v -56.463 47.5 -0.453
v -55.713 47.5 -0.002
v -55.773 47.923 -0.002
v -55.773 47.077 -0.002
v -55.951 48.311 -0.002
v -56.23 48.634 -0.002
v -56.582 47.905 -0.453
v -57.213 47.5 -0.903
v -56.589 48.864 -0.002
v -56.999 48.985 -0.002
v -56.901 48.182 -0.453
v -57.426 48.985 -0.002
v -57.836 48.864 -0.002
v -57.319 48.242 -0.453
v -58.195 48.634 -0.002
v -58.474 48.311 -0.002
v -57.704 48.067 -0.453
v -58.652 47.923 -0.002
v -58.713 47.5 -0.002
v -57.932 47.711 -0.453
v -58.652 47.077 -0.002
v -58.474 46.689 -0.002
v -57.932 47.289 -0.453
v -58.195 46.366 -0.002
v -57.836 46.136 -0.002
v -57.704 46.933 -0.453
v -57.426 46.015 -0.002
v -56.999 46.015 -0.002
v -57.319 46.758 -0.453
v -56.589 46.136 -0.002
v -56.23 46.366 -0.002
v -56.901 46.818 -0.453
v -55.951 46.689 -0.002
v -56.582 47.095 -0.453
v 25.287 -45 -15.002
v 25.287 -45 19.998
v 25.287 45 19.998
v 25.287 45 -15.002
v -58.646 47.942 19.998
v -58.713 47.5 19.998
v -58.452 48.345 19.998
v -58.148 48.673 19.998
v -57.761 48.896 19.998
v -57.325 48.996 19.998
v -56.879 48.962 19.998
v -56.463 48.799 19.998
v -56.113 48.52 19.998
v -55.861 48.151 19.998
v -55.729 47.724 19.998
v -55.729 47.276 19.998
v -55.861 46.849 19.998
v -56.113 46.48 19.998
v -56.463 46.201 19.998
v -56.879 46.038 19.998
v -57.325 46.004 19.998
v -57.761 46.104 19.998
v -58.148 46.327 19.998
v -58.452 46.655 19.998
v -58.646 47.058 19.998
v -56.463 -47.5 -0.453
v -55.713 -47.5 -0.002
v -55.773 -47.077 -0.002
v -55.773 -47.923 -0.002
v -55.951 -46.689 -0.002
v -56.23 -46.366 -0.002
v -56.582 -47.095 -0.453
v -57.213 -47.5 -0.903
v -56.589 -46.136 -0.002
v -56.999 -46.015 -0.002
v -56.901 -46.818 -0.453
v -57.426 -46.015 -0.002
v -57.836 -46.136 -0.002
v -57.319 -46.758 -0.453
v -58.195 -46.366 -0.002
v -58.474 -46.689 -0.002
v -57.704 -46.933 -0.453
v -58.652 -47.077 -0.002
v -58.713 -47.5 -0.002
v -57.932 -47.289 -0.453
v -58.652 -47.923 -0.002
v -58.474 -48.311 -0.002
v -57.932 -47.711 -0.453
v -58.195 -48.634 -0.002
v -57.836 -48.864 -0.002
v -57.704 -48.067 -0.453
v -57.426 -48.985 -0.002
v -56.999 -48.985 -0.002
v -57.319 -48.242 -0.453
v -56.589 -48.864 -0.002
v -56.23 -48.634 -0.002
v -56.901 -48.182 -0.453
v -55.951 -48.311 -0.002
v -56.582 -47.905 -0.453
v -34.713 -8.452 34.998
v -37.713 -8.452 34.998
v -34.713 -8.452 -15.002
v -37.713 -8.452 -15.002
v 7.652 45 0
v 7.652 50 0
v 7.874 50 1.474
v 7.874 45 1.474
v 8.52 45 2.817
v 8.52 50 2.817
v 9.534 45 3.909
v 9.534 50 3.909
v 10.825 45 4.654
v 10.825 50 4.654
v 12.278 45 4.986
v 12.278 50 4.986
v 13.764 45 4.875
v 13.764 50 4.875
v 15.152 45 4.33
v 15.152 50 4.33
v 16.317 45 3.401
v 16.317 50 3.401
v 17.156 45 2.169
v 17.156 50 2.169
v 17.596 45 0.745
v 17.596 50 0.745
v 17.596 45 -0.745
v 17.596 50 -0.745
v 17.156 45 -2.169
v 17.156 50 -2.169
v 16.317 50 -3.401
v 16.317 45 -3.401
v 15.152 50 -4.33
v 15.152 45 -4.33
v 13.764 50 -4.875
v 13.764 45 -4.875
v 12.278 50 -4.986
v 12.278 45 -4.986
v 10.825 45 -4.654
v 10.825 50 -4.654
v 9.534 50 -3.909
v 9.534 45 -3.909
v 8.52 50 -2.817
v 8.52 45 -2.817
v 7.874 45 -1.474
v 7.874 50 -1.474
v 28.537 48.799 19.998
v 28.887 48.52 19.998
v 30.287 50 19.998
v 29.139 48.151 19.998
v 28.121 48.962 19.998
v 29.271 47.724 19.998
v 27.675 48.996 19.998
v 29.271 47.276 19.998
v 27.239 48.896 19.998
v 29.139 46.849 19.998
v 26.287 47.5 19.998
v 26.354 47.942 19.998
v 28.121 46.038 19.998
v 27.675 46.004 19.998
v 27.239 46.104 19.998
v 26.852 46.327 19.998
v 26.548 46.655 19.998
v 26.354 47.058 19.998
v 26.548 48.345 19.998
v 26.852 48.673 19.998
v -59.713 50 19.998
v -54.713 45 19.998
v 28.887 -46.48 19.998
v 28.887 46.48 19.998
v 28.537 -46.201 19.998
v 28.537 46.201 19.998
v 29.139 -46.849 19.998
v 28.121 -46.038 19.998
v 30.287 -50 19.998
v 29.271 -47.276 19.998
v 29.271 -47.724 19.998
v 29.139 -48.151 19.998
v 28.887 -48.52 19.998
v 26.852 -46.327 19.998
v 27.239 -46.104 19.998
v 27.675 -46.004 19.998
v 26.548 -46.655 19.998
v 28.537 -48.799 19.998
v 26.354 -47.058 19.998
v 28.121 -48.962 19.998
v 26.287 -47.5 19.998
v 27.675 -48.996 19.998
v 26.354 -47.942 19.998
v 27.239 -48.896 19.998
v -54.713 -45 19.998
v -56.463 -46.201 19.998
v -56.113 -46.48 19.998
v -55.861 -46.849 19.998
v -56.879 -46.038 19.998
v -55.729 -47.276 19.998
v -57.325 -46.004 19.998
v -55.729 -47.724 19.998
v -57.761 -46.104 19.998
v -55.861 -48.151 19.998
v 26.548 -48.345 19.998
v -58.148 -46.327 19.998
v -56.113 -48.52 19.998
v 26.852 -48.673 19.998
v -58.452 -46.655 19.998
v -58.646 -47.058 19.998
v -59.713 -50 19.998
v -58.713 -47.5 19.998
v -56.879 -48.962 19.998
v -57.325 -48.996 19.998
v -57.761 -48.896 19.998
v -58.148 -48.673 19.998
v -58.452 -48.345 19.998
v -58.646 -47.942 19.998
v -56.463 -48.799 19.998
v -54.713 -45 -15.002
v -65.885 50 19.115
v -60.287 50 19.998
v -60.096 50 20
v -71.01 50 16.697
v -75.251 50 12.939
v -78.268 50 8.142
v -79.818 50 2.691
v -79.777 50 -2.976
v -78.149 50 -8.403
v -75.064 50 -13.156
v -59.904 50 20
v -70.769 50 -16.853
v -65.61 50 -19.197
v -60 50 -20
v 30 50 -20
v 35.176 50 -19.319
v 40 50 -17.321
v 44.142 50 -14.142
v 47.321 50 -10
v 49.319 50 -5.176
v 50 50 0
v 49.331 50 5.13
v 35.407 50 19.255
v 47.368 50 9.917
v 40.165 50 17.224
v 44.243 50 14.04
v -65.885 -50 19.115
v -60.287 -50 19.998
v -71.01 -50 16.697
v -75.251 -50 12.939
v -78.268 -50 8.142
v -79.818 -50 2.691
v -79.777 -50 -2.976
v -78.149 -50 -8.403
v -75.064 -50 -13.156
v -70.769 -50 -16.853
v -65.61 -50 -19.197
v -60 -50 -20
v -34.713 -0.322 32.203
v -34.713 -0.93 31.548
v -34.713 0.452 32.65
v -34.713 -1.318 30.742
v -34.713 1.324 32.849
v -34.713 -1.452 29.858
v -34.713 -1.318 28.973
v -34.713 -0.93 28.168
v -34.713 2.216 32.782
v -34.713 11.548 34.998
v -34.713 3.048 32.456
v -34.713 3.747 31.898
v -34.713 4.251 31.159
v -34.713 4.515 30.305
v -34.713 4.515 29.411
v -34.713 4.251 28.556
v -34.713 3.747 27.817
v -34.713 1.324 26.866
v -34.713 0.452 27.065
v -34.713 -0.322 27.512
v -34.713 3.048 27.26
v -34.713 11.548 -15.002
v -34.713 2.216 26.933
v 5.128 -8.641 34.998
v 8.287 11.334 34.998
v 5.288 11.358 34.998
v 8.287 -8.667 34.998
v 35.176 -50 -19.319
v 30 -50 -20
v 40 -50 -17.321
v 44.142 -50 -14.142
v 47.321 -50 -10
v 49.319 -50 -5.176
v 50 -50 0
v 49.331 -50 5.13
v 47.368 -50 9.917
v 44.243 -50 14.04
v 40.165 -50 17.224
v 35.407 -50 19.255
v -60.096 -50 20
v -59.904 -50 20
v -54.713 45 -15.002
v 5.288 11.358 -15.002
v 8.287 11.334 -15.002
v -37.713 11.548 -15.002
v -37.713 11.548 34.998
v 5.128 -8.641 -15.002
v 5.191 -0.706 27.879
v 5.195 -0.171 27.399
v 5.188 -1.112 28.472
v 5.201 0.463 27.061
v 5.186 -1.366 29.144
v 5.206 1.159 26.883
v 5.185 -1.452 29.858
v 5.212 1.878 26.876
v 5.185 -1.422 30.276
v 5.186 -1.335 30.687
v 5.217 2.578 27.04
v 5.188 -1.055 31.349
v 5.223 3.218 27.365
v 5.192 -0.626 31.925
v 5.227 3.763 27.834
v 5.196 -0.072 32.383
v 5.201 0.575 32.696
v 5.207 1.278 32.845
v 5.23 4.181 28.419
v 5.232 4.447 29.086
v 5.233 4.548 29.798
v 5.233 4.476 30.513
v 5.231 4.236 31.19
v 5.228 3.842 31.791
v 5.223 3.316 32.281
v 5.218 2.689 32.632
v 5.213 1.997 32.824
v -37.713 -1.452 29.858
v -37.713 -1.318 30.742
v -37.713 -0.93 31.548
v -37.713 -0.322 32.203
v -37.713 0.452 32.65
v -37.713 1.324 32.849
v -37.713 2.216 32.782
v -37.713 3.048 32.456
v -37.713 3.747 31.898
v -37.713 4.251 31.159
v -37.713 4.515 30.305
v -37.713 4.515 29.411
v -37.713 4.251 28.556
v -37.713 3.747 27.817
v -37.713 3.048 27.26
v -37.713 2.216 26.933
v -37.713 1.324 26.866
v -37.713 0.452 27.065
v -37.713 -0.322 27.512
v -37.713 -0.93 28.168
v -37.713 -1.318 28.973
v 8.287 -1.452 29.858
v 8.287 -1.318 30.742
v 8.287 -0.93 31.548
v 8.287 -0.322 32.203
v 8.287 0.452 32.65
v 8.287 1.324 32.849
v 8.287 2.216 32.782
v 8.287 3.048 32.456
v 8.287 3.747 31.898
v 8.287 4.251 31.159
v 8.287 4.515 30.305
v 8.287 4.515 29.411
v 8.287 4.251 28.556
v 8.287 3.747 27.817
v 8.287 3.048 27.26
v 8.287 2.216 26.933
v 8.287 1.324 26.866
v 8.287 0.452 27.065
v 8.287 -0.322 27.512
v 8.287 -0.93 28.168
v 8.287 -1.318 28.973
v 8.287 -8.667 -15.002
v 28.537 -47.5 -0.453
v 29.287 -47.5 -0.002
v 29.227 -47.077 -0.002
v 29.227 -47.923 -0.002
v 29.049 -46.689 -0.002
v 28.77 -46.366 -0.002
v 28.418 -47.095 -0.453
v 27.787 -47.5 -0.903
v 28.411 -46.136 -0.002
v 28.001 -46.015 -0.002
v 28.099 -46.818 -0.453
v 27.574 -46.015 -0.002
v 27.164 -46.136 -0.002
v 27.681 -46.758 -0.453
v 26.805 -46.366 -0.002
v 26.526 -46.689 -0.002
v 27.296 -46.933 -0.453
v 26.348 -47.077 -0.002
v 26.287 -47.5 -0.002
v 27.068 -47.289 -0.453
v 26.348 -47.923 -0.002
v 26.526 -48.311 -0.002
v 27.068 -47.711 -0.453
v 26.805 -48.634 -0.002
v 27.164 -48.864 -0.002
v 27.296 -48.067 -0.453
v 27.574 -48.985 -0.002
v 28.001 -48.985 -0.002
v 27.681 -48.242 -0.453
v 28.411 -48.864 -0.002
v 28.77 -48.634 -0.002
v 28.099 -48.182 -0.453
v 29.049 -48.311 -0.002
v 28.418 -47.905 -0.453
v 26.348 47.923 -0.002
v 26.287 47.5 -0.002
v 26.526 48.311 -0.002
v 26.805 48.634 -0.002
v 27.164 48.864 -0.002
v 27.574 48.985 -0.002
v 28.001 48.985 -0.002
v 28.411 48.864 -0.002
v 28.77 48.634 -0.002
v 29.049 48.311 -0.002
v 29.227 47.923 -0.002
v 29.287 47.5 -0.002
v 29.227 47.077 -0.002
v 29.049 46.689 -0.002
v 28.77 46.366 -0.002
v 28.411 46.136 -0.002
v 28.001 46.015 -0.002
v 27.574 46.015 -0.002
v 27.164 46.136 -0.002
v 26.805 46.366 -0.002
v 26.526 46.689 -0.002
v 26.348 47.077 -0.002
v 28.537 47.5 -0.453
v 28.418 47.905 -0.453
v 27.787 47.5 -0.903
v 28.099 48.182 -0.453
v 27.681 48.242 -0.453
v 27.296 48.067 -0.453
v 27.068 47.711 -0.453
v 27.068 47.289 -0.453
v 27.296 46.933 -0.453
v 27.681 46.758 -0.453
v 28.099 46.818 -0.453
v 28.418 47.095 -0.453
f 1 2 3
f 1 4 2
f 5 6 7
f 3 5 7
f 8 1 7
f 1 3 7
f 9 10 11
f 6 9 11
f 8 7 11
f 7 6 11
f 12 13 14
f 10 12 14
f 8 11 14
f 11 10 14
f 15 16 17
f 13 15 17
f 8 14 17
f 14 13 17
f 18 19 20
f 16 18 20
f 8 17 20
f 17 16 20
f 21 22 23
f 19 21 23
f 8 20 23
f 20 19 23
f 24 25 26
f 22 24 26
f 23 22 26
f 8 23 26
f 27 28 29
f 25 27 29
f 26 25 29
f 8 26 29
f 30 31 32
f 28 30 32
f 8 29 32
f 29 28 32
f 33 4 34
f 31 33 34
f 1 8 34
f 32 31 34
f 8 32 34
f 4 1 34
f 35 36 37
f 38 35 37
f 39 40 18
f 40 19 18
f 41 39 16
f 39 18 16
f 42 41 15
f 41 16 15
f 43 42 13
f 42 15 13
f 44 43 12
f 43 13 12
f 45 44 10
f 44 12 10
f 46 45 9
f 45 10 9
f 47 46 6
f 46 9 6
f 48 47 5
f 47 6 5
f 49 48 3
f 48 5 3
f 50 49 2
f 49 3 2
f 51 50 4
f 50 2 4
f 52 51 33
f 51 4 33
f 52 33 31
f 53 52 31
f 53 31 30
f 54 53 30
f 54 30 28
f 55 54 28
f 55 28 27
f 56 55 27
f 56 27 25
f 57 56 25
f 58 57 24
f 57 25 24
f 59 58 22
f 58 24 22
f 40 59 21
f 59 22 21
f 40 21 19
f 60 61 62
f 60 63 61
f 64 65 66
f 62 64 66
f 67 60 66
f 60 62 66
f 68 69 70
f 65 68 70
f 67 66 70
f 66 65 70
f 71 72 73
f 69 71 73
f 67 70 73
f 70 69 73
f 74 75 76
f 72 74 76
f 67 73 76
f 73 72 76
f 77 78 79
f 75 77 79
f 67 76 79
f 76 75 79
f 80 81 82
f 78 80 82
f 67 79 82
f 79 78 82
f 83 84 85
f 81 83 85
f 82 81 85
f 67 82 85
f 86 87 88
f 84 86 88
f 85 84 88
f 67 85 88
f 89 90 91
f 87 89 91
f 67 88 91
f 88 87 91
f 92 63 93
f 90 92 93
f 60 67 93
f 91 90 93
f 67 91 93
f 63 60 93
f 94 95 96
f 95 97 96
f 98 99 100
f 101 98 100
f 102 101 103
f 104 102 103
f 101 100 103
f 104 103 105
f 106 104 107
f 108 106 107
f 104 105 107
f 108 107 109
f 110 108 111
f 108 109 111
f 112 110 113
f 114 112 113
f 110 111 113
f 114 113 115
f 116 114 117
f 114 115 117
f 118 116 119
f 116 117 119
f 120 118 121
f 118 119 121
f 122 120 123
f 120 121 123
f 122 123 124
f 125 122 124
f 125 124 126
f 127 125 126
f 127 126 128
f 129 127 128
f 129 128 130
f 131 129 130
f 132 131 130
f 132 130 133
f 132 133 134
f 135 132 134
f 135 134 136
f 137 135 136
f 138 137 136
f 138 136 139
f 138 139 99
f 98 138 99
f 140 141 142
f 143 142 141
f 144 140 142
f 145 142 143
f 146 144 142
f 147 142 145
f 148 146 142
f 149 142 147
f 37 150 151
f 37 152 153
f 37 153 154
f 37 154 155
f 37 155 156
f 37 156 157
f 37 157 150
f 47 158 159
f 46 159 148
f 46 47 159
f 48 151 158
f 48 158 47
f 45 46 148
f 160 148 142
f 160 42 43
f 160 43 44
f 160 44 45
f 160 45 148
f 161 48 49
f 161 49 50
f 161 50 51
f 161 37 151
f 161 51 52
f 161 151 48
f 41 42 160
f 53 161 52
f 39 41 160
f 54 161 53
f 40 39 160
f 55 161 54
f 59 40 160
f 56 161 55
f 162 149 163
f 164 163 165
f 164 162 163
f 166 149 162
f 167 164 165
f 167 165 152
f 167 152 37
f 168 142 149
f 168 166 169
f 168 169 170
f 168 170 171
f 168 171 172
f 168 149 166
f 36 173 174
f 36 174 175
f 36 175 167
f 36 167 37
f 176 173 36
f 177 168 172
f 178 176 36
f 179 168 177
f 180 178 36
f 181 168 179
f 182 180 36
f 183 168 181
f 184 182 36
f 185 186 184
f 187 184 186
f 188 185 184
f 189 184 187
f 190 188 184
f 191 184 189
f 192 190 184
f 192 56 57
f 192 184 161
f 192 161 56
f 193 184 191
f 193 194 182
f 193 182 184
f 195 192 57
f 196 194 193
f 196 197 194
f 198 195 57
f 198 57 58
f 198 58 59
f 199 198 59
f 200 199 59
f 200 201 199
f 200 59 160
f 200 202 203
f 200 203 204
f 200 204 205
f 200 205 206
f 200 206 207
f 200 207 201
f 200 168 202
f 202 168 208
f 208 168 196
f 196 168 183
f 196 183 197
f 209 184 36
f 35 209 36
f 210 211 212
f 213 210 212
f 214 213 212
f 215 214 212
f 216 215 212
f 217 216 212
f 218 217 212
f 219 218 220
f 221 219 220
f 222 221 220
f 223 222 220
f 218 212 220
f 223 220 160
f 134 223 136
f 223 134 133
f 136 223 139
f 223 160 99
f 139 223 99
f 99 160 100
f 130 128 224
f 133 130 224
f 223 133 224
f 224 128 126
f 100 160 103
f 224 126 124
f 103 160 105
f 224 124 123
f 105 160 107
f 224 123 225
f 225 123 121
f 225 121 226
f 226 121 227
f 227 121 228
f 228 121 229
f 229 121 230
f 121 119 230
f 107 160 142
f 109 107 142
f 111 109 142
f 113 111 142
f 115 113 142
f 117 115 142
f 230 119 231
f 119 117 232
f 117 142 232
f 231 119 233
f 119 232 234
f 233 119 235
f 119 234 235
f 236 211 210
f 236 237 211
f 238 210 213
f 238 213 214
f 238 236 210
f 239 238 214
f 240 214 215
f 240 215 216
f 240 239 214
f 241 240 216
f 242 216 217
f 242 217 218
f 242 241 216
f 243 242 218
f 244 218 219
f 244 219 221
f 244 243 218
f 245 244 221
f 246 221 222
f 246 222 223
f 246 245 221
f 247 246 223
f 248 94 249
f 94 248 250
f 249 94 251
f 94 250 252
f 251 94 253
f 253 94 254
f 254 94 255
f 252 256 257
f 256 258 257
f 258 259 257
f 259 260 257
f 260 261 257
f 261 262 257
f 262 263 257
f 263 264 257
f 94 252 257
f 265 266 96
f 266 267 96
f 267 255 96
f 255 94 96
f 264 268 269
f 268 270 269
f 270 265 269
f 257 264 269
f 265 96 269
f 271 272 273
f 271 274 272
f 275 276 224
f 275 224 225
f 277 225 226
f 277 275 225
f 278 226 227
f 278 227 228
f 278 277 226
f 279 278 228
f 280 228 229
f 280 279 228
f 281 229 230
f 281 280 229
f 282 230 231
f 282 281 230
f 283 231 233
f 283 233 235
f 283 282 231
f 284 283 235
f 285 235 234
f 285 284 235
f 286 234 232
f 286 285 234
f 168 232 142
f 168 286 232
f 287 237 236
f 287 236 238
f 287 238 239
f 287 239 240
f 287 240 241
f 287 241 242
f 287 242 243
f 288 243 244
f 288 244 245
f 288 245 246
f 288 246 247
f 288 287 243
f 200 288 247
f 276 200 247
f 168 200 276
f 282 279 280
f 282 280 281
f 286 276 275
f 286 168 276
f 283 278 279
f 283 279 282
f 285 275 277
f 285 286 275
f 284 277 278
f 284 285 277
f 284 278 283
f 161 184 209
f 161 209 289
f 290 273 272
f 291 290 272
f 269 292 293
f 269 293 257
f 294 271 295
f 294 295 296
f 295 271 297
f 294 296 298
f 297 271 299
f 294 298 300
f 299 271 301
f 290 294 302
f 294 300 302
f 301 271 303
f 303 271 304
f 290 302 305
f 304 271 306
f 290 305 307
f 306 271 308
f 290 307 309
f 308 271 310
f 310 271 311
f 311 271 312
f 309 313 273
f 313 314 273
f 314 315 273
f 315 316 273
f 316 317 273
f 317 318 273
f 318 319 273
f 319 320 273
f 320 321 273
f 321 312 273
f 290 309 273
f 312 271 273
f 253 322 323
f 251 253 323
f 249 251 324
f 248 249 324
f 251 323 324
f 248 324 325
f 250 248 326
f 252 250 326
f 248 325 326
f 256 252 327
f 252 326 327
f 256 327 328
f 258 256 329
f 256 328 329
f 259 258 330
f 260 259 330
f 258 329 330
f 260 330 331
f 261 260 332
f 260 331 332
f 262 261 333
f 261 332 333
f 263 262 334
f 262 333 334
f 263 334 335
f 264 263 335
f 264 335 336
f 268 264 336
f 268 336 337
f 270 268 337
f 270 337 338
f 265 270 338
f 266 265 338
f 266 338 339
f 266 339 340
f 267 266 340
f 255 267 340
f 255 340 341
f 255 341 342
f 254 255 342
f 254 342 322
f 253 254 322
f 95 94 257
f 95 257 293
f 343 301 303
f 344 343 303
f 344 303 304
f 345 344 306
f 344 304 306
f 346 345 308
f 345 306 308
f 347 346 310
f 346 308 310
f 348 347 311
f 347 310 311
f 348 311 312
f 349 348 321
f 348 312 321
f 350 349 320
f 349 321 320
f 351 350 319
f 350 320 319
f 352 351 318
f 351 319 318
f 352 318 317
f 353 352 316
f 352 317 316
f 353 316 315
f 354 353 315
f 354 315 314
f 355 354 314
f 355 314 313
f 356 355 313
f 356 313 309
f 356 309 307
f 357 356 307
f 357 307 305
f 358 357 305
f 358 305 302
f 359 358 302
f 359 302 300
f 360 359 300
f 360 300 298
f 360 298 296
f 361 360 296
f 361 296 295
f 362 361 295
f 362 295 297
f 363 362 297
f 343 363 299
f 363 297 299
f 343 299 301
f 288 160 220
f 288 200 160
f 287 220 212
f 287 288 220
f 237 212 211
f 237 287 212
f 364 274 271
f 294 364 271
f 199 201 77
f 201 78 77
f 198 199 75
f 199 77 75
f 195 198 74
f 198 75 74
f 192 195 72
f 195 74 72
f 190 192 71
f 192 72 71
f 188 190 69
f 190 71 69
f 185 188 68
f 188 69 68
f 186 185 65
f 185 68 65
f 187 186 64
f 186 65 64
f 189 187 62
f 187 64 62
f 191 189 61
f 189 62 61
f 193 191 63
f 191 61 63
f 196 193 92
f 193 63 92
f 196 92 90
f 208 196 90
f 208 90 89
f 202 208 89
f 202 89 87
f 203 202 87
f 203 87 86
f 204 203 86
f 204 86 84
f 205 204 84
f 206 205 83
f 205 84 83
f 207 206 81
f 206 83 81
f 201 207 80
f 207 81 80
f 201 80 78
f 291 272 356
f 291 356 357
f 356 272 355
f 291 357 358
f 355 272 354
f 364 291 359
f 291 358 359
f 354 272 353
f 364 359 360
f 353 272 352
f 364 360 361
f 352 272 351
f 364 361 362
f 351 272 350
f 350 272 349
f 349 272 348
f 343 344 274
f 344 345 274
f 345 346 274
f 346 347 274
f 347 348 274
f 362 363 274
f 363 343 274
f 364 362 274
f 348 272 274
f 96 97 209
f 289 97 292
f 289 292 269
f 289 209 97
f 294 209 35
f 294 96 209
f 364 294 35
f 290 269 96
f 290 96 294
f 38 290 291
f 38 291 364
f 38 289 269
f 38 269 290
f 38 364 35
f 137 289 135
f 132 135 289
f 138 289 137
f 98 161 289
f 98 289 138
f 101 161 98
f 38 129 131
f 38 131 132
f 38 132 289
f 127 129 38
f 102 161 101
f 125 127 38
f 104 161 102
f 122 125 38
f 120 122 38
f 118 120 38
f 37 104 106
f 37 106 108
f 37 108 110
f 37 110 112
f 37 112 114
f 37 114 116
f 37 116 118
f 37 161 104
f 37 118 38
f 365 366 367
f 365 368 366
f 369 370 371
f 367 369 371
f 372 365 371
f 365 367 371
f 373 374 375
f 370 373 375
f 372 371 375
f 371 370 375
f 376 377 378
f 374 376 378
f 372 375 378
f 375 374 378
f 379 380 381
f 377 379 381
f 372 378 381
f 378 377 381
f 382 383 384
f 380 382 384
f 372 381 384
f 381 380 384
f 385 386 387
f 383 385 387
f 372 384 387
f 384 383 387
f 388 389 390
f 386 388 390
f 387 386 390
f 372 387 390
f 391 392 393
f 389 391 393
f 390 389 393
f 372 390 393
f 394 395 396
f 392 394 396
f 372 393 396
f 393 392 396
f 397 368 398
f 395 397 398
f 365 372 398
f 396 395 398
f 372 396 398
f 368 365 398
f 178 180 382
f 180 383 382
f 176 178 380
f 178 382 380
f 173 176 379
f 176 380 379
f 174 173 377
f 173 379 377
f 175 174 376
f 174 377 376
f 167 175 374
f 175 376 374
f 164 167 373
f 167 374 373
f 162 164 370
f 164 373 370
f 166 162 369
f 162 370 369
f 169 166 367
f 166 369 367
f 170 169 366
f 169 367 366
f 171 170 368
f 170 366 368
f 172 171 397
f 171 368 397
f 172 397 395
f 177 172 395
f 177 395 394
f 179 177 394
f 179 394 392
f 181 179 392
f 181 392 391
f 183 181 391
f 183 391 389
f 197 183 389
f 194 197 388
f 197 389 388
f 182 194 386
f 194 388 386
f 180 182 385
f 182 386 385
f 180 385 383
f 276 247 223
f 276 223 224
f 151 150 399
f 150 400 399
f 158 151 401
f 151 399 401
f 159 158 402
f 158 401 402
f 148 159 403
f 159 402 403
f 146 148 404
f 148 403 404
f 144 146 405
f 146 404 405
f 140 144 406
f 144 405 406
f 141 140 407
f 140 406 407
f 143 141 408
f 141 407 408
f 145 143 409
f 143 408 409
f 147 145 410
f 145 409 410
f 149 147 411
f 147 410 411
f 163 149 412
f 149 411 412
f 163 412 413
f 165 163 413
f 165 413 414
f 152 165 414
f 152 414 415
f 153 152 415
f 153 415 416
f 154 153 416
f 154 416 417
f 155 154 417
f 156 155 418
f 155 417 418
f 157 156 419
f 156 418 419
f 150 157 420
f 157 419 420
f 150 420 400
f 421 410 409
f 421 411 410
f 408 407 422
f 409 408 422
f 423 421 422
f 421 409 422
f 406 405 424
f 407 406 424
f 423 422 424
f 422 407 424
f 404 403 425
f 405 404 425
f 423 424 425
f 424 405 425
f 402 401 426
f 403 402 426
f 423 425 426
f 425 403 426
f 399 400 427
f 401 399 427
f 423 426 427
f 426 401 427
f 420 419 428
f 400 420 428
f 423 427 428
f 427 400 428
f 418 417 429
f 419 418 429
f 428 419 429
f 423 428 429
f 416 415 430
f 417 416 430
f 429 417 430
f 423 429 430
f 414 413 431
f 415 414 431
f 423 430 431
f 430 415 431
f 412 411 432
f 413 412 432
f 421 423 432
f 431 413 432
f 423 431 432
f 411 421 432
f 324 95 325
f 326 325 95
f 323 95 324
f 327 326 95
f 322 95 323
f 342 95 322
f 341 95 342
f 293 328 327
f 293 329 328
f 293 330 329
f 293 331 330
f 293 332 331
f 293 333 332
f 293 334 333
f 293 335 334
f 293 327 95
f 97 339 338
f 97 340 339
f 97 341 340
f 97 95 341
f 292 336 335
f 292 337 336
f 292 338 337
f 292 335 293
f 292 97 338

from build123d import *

# Parameters (mm, degrees)
F1_DEPTH = 50
F2_W     = 80
F2_H     = 90
F2_W_2   = 3
F2_H_2   = 20
F3_DEPTH = 35
F4_D     = 3
F4_DEPTH = 20
F4_TIP   = 0.9012909285
F5_R     = 5
F6_DEPTH = 10
F7_DEPTH = 15
F8_R     = 3
F9_DEPTH = 60


# Not quite as in the source:
# - a feature names something its author has since deleted; it is built from what else it names


with BuildPart() as f1:
    # F0 (on Front) → F1 (new body, symmetric)
    with BuildSketch(Plane.XZ):
        with BuildLine():
            Line((-59.7125668165, 19.9979344475), (-60.2874331835, 19.9979344475))
            ThreePointArc((-60.2874331835, 19.9979344475), (-79.9994836052, -0.1437203026), (-60, -20))
            ThreePointArc((-60, -20), (-45.8578643763, -14.1421356237), (-40, 0))
            ThreePointArc((-40, 0), (-45.756603922, 14.0401448769), (-59.7125668165, 19.9979344475))
        make_face()
        with BuildLine():
            ThreePointArc((-59.7125668165, 19.9979344475), (-60, 20), (-60.2874331835, 19.9979344475))
            Line((-60.2874331835, 19.9979344475), (-59.7125668165, 19.9979344475))
        make_face()
        with BuildLine():
            ThreePointArc((-40, 0), (-45.8578643763, -14.1421356237), (-60, -20))
            Line((-60, -20), (30, -20))
            ThreePointArc((30, -20), (10.0005163948, -0.1437203026), (29.7125668165, 19.9979344475))
            Line((29.7125668165, 19.9979344475), (-59.7125668165, 19.9979344475))
            ThreePointArc((-59.7125668165, 19.9979344475), (-45.756603922, 14.0401448769), (-40, 0))
        make_face()
        with BuildLine():
            ThreePointArc((29.7125668165, 19.9979344475), (10.0005163948, -0.1437203026), (30, -20))
            ThreePointArc((30, -20), (44.1421356237, -14.1421356237), (50, 0))
            ThreePointArc((50, 0), (44.243396078, 14.0401448769), (30.2874331835, 19.9979344475))
            Line((30.2874331835, 19.9979344475), (29.7125668165, 19.9979344475))
        make_face()
    extrude(amount=F1_DEPTH, both=True)

    # F2 (on face) → F3 (cut)
    with BuildSketch(Plane.XY.offset(19.9979344475)):
        with Locations((-14.7125668165, 0)):
            Rectangle(F2_W, F2_H)
        with Locations((-36.2125668165, 1.5482969955)):
            Rectangle(F2_W_2, F2_H_2, mode=Mode.SUBTRACT)
        Polygon((8.2874331835, 11.3340624973), (8.2874331835, -8.6665749961), (5.1278462474, -8.641347646), (5.2875288045, 11.3580148809), align=None, mode=Mode.SUBTRACT)
    extrude(amount=-F3_DEPTH, mode=Mode.SUBTRACT)

    # F4
    with Locations(Plane.XY.offset(19.9979344475)):
        with Locations((-57.2125668165, 47.5), (27.7874331835, 47.5), (27.7874331835, -47.5), (-57.2125668165, -47.5)):
            Hole(F4_D / 2, depth=F4_DEPTH)
            with Locations((0, 0, -(F4_DEPTH + F4_TIP / 2))):  # 118° drill point
                Cone(0, F4_D / 2, F4_TIP, mode=Mode.SUBTRACT)

    # F5 (on face) → F6 (cut)
    with BuildSketch(Plane(origin=(0, 50, 0), x_dir=(-1, 0, 0), z_dir=(0, 1, 0))):
        with Locations((-12.6515543088, 0)):
            Circle(F5_R)
    extrude(amount=-F6_DEPTH, mode=Mode.SUBTRACT)

    # F7 (add): faces of the model
    f7_faces = [f1.faces().sort_by_distance(p)[0] for p in [
        (-36.2125668165, 1.5482969955, 19.9979344475),
        (6.7472153787, 1.2596232378, 19.9979344475),
    ]]
    extrude(f7_faces, amount=F7_DEPTH)

    # F8 (on face) → F9 (cut)
    with BuildSketch(Plane(origin=(-37.7125668165, 0, 0), x_dir=(0, -1, 0), z_dir=(-1, 0, 0))):
        with Locations((-1.5482969955, 29.857664355)):
            Circle(F8_R)
    extrude(amount=-F9_DEPTH, mode=Mode.SUBTRACT)


solid = f1.part
